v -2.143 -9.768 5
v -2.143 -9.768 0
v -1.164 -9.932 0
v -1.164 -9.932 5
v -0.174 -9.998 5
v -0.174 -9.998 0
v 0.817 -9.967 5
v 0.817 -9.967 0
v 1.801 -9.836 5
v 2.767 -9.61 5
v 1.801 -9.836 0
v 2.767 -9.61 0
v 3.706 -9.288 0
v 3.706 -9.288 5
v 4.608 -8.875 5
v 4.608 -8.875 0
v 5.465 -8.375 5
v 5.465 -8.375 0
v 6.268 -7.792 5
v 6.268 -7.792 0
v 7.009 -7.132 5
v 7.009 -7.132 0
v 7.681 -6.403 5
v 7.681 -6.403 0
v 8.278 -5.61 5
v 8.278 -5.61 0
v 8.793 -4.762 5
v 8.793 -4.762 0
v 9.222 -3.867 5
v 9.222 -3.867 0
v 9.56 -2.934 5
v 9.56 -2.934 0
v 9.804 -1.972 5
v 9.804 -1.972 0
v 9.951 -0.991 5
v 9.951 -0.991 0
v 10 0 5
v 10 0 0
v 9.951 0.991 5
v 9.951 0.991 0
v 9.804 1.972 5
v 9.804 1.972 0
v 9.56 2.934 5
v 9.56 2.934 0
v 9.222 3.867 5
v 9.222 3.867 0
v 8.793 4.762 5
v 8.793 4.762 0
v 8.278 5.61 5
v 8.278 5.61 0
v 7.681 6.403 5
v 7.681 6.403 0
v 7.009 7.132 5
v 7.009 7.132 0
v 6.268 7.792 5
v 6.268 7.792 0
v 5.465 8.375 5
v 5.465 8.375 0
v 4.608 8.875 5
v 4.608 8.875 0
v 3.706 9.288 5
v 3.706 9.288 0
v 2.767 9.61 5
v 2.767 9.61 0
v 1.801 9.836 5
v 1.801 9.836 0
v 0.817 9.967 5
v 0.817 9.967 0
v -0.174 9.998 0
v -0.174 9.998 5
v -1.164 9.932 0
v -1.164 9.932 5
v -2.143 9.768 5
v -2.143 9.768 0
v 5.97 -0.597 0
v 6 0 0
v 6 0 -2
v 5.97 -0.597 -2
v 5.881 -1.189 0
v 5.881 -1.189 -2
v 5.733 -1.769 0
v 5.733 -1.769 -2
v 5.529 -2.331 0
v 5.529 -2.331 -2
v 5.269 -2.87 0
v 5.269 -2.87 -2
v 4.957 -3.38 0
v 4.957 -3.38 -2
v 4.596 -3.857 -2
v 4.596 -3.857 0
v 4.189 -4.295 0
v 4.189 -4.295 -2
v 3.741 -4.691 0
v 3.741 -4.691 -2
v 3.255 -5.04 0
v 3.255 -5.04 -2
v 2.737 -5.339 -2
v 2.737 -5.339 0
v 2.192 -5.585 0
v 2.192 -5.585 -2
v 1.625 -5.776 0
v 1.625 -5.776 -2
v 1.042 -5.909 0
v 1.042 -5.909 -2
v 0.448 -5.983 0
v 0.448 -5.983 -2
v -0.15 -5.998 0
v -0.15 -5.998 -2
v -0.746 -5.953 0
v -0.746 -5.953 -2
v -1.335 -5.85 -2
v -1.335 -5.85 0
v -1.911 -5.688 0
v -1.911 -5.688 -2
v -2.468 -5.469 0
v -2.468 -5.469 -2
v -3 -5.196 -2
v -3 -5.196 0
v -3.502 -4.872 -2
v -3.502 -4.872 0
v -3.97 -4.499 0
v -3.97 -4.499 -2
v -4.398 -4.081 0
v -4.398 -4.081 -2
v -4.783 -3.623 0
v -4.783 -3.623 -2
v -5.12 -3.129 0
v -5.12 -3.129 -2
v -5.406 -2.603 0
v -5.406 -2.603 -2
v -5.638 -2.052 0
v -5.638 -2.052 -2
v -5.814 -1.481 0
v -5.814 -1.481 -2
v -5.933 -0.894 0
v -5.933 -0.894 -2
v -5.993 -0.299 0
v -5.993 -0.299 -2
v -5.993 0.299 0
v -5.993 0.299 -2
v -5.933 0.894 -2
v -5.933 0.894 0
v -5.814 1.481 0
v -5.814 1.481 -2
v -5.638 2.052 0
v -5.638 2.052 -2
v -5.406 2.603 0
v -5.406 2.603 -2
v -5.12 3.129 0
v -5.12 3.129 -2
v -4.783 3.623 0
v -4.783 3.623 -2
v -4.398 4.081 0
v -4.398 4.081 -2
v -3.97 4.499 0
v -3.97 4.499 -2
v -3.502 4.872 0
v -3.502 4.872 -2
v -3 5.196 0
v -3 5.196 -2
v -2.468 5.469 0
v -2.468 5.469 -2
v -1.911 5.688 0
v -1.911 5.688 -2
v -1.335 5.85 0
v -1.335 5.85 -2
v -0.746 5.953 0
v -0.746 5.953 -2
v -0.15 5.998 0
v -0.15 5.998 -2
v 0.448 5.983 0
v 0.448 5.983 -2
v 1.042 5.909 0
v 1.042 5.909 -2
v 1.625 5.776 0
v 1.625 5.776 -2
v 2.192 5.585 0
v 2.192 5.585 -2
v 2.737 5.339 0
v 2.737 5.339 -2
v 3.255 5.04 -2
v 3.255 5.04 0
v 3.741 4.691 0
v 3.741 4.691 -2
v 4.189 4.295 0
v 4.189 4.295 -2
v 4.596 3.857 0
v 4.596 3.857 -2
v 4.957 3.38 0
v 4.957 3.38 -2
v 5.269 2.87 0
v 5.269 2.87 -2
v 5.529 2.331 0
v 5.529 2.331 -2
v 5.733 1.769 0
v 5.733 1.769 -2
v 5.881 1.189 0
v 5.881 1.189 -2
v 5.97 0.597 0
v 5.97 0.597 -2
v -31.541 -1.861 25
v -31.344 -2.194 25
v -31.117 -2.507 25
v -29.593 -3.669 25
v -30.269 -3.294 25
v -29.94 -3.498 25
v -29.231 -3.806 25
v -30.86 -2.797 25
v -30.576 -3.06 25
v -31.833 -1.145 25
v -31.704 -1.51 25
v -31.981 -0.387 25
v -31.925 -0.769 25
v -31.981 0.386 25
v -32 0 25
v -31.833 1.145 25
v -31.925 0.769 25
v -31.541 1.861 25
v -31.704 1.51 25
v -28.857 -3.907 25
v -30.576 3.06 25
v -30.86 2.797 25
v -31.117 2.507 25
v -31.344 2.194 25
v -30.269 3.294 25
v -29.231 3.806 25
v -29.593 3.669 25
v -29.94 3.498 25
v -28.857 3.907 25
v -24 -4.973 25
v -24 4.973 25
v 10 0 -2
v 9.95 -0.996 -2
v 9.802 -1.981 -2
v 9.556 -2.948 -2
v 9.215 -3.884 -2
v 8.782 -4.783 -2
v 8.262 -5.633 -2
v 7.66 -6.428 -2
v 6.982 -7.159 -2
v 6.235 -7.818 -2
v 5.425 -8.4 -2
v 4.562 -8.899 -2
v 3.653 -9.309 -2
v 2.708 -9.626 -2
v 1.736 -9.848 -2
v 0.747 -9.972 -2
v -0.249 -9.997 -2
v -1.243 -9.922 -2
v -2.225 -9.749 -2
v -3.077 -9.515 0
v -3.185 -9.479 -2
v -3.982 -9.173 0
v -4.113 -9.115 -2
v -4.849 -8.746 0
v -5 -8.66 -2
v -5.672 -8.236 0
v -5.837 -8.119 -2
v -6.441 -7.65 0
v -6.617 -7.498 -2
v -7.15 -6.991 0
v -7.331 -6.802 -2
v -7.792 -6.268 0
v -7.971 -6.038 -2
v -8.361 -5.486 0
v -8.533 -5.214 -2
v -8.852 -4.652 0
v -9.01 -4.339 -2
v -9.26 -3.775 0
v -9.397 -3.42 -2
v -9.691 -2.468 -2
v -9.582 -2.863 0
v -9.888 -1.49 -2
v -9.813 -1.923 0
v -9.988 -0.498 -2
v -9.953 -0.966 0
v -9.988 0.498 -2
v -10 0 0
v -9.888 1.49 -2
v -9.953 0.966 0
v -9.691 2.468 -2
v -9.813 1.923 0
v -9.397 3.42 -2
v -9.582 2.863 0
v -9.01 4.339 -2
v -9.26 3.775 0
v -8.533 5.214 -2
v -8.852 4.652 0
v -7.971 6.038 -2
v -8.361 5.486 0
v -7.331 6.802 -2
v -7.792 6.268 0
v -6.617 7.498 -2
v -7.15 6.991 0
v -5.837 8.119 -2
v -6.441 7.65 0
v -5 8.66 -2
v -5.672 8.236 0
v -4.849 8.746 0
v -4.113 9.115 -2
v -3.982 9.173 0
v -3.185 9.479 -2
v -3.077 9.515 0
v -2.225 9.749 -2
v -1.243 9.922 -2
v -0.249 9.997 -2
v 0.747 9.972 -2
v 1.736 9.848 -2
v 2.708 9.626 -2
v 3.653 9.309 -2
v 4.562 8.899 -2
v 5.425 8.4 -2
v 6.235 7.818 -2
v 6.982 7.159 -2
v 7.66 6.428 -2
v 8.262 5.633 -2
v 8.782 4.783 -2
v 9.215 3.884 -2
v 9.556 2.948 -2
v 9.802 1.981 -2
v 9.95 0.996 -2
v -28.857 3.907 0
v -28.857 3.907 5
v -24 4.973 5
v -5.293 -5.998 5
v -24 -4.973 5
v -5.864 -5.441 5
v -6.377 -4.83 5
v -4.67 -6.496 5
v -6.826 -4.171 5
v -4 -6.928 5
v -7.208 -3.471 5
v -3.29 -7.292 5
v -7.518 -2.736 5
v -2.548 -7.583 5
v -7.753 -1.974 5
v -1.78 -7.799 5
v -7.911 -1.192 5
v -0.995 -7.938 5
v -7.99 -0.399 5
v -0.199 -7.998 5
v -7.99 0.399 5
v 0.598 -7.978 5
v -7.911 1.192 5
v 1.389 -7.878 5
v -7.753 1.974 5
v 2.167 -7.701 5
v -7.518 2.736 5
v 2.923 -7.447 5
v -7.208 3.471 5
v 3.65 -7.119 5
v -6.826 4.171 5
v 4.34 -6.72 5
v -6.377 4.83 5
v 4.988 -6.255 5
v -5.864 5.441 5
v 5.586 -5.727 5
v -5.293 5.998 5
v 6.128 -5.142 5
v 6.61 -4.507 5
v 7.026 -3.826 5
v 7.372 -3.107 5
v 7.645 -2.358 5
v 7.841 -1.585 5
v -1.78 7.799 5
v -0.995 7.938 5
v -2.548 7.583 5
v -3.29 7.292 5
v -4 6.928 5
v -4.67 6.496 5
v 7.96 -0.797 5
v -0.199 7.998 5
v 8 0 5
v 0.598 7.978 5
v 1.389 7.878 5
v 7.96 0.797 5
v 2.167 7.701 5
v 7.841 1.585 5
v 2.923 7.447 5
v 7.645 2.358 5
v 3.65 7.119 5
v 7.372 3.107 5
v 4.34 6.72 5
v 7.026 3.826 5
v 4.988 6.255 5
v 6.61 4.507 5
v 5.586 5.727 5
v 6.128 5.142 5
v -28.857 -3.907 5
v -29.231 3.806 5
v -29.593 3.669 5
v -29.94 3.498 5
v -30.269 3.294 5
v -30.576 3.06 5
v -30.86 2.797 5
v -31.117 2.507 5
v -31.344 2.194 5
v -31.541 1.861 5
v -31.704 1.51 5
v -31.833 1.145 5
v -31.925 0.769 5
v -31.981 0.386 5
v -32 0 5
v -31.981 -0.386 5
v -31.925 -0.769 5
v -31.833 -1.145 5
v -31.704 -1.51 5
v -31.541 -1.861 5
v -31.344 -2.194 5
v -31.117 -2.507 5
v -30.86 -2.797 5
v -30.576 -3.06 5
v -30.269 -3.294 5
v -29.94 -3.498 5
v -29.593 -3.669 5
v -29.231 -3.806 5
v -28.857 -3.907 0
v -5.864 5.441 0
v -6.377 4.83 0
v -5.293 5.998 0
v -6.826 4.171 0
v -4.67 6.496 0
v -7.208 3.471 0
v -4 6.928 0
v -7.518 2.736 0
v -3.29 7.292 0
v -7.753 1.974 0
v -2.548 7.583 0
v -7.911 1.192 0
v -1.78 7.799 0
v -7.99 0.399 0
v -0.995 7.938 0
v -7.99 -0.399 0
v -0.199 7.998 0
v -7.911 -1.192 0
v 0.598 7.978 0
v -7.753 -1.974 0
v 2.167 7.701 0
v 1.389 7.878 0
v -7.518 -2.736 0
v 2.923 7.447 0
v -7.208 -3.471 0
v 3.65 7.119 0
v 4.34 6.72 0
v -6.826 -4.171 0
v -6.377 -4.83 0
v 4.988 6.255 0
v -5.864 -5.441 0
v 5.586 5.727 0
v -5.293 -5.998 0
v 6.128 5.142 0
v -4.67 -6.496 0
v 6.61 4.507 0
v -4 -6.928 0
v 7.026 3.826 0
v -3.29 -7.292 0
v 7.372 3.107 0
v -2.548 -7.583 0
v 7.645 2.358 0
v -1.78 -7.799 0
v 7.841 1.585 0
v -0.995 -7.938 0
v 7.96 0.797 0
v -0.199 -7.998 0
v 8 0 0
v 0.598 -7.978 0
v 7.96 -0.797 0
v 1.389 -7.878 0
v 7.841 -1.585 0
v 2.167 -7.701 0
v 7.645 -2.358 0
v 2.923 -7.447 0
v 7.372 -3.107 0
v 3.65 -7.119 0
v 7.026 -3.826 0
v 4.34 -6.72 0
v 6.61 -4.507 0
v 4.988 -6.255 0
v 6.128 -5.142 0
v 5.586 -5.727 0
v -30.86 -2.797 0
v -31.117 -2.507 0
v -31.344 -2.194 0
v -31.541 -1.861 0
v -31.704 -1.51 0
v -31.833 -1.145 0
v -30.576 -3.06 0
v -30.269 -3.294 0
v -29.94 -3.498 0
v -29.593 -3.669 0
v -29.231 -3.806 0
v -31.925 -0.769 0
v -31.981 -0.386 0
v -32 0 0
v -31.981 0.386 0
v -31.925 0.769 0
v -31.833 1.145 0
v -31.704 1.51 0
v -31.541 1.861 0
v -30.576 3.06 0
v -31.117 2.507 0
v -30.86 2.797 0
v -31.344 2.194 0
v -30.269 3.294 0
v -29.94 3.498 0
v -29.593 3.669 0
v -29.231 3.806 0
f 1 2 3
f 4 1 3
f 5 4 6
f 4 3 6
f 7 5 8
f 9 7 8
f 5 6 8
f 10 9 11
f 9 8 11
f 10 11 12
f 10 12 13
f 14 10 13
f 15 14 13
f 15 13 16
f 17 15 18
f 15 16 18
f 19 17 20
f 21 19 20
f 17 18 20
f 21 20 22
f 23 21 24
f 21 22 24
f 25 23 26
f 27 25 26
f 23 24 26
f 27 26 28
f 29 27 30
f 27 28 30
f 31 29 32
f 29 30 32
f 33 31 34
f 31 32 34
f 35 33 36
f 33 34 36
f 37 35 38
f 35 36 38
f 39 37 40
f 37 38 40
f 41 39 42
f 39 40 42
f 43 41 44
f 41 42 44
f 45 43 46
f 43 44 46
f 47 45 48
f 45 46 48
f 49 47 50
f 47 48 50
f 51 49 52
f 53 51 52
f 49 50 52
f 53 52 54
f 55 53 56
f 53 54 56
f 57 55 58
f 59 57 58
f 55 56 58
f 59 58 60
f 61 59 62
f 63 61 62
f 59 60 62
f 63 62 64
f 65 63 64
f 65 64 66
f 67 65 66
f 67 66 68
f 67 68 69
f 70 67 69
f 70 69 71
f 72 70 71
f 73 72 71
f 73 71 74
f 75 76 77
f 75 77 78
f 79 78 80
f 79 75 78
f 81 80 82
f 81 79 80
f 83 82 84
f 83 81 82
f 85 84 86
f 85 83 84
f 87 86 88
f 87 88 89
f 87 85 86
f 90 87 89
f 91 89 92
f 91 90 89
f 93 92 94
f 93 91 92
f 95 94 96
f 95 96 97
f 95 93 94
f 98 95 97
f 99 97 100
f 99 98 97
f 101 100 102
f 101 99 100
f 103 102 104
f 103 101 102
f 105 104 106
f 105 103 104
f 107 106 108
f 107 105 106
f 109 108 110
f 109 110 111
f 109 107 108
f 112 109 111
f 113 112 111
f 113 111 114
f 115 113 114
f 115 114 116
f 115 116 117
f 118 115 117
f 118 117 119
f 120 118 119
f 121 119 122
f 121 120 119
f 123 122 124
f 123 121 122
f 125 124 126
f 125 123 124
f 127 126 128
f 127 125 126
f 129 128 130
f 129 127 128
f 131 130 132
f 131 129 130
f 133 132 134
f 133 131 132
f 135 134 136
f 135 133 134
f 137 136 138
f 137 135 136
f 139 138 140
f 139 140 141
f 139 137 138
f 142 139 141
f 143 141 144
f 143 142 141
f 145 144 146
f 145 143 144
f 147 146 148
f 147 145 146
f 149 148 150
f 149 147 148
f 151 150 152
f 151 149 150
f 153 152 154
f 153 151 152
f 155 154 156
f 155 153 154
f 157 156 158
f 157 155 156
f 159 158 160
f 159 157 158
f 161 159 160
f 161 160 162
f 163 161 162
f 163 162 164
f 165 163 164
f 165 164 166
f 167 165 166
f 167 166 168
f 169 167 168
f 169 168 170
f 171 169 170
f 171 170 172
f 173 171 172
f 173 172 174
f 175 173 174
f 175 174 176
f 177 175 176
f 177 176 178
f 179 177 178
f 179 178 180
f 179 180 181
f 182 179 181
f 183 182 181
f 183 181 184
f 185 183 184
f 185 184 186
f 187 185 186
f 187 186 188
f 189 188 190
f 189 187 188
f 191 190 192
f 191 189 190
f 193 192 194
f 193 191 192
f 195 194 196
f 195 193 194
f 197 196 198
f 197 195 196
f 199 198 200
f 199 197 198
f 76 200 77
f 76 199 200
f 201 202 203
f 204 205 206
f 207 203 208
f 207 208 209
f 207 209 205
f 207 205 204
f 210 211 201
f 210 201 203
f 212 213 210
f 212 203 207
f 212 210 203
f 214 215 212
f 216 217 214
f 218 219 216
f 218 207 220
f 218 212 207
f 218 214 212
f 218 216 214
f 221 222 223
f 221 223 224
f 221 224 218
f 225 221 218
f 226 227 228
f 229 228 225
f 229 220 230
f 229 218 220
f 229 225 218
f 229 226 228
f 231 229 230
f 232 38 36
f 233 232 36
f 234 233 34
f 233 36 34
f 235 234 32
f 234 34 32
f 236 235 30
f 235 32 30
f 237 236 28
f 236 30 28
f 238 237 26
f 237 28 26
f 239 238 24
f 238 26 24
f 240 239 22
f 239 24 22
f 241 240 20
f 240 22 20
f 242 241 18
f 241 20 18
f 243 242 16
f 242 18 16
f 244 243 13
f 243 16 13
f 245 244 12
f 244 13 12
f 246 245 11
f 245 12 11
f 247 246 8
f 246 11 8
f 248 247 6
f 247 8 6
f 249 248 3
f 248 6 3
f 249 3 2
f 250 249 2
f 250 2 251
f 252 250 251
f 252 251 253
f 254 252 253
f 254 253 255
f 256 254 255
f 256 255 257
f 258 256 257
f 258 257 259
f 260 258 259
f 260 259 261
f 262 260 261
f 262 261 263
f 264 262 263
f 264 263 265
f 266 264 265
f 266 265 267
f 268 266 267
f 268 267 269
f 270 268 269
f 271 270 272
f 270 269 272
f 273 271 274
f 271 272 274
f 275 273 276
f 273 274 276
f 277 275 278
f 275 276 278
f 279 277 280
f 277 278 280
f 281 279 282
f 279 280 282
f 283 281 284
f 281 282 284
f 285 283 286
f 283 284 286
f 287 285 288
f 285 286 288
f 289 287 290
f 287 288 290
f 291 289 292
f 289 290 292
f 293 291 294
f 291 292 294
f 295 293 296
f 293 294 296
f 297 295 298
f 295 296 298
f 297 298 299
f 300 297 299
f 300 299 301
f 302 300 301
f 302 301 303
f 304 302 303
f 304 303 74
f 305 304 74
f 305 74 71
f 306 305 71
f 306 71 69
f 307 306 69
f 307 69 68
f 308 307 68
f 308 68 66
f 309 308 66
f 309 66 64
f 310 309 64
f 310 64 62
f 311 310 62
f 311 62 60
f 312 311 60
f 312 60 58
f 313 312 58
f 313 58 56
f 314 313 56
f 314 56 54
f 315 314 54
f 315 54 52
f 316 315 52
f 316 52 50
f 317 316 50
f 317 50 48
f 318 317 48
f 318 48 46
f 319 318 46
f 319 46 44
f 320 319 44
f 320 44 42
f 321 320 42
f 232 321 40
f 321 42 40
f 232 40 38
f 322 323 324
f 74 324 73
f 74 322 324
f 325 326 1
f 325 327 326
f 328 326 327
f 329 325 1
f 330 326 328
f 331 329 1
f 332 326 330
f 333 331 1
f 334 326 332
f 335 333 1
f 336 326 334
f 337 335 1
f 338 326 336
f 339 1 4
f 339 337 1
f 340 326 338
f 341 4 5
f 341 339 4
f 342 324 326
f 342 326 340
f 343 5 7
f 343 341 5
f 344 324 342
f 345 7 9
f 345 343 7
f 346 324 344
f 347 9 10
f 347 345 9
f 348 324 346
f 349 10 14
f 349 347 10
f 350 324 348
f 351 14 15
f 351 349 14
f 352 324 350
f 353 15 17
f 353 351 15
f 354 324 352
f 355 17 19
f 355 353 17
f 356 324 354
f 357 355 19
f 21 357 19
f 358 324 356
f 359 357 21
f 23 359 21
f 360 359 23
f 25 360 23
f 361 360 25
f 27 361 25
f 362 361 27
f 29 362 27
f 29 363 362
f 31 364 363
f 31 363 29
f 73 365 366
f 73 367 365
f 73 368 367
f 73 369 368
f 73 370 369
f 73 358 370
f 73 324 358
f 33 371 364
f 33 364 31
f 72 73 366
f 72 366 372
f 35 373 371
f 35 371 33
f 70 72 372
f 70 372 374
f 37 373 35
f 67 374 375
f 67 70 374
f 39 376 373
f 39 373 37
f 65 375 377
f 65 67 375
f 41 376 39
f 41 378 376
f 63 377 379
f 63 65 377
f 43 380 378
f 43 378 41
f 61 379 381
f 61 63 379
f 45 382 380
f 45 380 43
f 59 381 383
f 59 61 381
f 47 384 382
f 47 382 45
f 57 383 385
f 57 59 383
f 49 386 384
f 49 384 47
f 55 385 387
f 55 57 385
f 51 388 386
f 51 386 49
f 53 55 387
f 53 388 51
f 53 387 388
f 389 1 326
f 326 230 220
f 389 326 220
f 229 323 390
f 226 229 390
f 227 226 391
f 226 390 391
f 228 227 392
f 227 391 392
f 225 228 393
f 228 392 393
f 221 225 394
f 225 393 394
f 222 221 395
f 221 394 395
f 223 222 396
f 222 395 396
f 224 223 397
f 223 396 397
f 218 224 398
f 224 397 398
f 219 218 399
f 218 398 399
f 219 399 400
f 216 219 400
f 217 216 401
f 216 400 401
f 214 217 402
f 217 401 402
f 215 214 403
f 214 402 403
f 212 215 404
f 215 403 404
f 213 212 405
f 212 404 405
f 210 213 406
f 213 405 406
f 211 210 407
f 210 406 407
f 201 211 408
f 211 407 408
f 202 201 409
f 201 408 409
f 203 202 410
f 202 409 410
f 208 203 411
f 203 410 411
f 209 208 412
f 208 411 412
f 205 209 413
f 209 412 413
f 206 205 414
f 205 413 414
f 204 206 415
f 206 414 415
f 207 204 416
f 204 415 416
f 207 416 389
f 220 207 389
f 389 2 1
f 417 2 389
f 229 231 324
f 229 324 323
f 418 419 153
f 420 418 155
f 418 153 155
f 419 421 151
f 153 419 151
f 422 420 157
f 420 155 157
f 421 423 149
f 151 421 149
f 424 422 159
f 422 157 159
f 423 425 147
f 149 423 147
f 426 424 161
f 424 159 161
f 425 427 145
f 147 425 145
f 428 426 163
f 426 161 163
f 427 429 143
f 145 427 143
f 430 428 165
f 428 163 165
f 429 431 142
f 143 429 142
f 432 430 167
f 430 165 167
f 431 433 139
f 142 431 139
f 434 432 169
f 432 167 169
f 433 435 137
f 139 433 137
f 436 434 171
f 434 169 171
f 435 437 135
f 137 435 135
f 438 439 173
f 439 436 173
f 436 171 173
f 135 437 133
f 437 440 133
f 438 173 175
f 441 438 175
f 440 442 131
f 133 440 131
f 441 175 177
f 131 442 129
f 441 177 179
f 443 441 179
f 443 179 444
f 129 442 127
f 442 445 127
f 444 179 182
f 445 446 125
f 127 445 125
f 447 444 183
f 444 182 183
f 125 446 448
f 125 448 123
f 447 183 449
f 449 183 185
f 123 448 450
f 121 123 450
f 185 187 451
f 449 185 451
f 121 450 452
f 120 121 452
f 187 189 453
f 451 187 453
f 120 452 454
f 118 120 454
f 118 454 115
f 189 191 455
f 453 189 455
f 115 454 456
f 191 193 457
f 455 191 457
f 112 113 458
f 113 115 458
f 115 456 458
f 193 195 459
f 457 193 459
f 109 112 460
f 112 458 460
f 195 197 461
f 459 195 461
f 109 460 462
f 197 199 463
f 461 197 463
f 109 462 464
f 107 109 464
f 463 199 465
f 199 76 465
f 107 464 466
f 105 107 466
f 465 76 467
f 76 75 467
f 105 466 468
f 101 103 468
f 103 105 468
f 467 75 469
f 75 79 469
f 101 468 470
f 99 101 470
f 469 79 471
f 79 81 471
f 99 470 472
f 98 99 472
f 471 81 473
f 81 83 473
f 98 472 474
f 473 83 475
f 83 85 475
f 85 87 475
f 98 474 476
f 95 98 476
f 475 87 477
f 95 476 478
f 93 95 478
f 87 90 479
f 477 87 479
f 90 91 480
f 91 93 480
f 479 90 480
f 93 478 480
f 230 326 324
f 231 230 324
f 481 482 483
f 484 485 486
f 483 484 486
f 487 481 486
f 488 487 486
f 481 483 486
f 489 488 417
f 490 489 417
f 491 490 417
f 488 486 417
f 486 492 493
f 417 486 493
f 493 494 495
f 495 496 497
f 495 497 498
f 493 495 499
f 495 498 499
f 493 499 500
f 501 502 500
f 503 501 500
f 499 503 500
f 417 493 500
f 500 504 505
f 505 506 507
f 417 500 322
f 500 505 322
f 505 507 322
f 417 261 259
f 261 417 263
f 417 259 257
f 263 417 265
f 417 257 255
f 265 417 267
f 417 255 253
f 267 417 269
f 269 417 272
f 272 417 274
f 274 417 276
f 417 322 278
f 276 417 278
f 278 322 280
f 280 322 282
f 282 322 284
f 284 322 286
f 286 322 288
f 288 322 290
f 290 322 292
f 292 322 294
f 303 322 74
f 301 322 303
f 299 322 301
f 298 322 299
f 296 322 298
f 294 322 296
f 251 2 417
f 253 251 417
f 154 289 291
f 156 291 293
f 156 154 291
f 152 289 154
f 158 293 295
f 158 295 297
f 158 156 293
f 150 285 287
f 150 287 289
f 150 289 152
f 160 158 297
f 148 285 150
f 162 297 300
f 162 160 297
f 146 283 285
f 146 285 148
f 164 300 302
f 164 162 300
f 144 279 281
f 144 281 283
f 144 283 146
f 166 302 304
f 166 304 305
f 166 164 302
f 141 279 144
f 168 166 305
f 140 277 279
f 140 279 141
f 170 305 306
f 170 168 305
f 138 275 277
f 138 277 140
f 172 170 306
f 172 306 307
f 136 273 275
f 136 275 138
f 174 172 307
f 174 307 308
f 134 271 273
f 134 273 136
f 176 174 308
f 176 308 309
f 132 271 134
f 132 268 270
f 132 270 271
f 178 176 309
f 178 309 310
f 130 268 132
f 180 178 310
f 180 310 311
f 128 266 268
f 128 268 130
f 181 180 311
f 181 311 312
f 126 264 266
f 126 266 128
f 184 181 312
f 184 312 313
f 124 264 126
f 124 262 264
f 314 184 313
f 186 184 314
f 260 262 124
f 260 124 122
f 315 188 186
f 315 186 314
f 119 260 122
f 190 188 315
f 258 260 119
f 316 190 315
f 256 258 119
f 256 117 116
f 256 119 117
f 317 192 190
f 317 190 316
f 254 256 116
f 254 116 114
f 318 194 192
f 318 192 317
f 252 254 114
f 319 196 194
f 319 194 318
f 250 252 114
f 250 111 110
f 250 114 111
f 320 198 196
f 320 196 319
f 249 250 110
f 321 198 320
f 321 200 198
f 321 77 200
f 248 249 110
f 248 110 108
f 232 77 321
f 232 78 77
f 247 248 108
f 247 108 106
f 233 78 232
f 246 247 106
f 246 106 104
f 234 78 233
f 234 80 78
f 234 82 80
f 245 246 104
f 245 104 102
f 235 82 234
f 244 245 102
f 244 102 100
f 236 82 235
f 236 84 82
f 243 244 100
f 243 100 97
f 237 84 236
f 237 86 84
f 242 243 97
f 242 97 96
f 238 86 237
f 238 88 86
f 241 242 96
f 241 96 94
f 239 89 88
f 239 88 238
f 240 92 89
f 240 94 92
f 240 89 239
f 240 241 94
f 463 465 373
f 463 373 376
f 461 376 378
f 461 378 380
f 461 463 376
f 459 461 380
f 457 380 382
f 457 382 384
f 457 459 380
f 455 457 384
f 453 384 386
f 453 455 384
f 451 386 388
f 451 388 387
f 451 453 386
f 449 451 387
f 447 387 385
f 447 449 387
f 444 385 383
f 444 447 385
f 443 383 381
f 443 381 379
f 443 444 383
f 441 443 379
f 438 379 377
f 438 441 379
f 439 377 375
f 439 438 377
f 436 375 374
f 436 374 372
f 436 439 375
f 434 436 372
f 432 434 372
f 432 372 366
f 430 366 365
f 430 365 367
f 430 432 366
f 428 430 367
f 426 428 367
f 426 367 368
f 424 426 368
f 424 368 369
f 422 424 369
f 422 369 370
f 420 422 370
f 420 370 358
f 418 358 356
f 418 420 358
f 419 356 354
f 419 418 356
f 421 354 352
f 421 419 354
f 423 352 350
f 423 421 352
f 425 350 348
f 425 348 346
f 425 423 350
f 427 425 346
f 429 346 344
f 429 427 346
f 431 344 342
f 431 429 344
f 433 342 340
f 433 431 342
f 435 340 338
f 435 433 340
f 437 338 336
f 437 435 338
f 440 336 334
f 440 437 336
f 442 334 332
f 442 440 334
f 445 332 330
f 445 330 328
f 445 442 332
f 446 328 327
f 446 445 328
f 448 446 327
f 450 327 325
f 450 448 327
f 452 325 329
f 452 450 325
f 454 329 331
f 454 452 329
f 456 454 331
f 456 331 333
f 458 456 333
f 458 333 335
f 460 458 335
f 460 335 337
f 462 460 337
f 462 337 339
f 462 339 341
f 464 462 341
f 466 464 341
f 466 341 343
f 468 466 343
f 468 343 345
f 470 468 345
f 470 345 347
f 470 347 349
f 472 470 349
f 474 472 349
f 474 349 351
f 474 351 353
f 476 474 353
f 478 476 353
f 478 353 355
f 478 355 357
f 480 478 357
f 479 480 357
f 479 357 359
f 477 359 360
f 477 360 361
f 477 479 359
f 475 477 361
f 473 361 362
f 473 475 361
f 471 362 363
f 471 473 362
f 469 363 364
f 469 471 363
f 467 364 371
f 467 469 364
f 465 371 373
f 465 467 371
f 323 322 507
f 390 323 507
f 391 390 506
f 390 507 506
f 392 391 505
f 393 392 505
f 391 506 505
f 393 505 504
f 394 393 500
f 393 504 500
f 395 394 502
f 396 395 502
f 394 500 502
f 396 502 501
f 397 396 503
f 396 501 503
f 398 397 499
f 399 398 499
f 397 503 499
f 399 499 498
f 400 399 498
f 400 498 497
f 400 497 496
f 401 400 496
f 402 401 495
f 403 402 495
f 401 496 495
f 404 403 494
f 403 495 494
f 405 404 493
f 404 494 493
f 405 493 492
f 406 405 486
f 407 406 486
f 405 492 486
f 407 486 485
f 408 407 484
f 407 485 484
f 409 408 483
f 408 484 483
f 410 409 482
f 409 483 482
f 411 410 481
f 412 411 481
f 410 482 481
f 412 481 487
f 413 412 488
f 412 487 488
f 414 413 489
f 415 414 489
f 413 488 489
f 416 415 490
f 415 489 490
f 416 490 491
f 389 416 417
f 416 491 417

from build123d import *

# Parameters (mm, degrees)
SKETCH_R      = 8
PAD_DEPTH     = 5
PAD001_DEPTH  = 20
SKETCH002_R   = 10
SKETCH002_R_2 = 6
PAD002_DEPTH  = 2


with BuildPart() as part:
    # Sketch → Pad (new body)
    with BuildSketch(Plane.XY):
        with BuildLine():
            ThreePointArc((-2.142857, -9.76771), (10, 0), (-2.142857, 9.76771))
            Line((-28.857143, 3.907084), (-2.142857, 9.76771))
            ThreePointArc((-28.857143, 3.907084), (-32, 0), (-28.857143, -3.907084))
            Line((-2.142857, -9.76771), (-28.857143, -3.907084))
        make_face()
        Circle(SKETCH_R, mode=Mode.SUBTRACT)
    extrude(amount=PAD_DEPTH)

    # Sketch001 (on Face7 of Pad) → Pad001 (join)
    with BuildSketch(Plane.XY.offset(5)):
        with BuildLine():
            ThreePointArc((-28.857143, 3.907084), (-32, -1.3e-05), (-28.857117, -3.90709))
            Line((-24, -4.972619), (-28.857117, -3.90709))
            Line((-24, -4.972619), (-24, 4.972653))
            Line((-24, 4.972653), (-28.857143, 3.907084))
        make_face()
    extrude(amount=PAD001_DEPTH)

    # Sketch002 → Pad002 (join)
    with BuildSketch(Plane(origin=(0, 0, 0), x_dir=(1, 0, 0), z_dir=(0, 0, -1))):
        Circle(SKETCH002_R)
        Circle(SKETCH002_R_2, mode=Mode.SUBTRACT)
    extrude(amount=PAD002_DEPTH)


solid = part.part
